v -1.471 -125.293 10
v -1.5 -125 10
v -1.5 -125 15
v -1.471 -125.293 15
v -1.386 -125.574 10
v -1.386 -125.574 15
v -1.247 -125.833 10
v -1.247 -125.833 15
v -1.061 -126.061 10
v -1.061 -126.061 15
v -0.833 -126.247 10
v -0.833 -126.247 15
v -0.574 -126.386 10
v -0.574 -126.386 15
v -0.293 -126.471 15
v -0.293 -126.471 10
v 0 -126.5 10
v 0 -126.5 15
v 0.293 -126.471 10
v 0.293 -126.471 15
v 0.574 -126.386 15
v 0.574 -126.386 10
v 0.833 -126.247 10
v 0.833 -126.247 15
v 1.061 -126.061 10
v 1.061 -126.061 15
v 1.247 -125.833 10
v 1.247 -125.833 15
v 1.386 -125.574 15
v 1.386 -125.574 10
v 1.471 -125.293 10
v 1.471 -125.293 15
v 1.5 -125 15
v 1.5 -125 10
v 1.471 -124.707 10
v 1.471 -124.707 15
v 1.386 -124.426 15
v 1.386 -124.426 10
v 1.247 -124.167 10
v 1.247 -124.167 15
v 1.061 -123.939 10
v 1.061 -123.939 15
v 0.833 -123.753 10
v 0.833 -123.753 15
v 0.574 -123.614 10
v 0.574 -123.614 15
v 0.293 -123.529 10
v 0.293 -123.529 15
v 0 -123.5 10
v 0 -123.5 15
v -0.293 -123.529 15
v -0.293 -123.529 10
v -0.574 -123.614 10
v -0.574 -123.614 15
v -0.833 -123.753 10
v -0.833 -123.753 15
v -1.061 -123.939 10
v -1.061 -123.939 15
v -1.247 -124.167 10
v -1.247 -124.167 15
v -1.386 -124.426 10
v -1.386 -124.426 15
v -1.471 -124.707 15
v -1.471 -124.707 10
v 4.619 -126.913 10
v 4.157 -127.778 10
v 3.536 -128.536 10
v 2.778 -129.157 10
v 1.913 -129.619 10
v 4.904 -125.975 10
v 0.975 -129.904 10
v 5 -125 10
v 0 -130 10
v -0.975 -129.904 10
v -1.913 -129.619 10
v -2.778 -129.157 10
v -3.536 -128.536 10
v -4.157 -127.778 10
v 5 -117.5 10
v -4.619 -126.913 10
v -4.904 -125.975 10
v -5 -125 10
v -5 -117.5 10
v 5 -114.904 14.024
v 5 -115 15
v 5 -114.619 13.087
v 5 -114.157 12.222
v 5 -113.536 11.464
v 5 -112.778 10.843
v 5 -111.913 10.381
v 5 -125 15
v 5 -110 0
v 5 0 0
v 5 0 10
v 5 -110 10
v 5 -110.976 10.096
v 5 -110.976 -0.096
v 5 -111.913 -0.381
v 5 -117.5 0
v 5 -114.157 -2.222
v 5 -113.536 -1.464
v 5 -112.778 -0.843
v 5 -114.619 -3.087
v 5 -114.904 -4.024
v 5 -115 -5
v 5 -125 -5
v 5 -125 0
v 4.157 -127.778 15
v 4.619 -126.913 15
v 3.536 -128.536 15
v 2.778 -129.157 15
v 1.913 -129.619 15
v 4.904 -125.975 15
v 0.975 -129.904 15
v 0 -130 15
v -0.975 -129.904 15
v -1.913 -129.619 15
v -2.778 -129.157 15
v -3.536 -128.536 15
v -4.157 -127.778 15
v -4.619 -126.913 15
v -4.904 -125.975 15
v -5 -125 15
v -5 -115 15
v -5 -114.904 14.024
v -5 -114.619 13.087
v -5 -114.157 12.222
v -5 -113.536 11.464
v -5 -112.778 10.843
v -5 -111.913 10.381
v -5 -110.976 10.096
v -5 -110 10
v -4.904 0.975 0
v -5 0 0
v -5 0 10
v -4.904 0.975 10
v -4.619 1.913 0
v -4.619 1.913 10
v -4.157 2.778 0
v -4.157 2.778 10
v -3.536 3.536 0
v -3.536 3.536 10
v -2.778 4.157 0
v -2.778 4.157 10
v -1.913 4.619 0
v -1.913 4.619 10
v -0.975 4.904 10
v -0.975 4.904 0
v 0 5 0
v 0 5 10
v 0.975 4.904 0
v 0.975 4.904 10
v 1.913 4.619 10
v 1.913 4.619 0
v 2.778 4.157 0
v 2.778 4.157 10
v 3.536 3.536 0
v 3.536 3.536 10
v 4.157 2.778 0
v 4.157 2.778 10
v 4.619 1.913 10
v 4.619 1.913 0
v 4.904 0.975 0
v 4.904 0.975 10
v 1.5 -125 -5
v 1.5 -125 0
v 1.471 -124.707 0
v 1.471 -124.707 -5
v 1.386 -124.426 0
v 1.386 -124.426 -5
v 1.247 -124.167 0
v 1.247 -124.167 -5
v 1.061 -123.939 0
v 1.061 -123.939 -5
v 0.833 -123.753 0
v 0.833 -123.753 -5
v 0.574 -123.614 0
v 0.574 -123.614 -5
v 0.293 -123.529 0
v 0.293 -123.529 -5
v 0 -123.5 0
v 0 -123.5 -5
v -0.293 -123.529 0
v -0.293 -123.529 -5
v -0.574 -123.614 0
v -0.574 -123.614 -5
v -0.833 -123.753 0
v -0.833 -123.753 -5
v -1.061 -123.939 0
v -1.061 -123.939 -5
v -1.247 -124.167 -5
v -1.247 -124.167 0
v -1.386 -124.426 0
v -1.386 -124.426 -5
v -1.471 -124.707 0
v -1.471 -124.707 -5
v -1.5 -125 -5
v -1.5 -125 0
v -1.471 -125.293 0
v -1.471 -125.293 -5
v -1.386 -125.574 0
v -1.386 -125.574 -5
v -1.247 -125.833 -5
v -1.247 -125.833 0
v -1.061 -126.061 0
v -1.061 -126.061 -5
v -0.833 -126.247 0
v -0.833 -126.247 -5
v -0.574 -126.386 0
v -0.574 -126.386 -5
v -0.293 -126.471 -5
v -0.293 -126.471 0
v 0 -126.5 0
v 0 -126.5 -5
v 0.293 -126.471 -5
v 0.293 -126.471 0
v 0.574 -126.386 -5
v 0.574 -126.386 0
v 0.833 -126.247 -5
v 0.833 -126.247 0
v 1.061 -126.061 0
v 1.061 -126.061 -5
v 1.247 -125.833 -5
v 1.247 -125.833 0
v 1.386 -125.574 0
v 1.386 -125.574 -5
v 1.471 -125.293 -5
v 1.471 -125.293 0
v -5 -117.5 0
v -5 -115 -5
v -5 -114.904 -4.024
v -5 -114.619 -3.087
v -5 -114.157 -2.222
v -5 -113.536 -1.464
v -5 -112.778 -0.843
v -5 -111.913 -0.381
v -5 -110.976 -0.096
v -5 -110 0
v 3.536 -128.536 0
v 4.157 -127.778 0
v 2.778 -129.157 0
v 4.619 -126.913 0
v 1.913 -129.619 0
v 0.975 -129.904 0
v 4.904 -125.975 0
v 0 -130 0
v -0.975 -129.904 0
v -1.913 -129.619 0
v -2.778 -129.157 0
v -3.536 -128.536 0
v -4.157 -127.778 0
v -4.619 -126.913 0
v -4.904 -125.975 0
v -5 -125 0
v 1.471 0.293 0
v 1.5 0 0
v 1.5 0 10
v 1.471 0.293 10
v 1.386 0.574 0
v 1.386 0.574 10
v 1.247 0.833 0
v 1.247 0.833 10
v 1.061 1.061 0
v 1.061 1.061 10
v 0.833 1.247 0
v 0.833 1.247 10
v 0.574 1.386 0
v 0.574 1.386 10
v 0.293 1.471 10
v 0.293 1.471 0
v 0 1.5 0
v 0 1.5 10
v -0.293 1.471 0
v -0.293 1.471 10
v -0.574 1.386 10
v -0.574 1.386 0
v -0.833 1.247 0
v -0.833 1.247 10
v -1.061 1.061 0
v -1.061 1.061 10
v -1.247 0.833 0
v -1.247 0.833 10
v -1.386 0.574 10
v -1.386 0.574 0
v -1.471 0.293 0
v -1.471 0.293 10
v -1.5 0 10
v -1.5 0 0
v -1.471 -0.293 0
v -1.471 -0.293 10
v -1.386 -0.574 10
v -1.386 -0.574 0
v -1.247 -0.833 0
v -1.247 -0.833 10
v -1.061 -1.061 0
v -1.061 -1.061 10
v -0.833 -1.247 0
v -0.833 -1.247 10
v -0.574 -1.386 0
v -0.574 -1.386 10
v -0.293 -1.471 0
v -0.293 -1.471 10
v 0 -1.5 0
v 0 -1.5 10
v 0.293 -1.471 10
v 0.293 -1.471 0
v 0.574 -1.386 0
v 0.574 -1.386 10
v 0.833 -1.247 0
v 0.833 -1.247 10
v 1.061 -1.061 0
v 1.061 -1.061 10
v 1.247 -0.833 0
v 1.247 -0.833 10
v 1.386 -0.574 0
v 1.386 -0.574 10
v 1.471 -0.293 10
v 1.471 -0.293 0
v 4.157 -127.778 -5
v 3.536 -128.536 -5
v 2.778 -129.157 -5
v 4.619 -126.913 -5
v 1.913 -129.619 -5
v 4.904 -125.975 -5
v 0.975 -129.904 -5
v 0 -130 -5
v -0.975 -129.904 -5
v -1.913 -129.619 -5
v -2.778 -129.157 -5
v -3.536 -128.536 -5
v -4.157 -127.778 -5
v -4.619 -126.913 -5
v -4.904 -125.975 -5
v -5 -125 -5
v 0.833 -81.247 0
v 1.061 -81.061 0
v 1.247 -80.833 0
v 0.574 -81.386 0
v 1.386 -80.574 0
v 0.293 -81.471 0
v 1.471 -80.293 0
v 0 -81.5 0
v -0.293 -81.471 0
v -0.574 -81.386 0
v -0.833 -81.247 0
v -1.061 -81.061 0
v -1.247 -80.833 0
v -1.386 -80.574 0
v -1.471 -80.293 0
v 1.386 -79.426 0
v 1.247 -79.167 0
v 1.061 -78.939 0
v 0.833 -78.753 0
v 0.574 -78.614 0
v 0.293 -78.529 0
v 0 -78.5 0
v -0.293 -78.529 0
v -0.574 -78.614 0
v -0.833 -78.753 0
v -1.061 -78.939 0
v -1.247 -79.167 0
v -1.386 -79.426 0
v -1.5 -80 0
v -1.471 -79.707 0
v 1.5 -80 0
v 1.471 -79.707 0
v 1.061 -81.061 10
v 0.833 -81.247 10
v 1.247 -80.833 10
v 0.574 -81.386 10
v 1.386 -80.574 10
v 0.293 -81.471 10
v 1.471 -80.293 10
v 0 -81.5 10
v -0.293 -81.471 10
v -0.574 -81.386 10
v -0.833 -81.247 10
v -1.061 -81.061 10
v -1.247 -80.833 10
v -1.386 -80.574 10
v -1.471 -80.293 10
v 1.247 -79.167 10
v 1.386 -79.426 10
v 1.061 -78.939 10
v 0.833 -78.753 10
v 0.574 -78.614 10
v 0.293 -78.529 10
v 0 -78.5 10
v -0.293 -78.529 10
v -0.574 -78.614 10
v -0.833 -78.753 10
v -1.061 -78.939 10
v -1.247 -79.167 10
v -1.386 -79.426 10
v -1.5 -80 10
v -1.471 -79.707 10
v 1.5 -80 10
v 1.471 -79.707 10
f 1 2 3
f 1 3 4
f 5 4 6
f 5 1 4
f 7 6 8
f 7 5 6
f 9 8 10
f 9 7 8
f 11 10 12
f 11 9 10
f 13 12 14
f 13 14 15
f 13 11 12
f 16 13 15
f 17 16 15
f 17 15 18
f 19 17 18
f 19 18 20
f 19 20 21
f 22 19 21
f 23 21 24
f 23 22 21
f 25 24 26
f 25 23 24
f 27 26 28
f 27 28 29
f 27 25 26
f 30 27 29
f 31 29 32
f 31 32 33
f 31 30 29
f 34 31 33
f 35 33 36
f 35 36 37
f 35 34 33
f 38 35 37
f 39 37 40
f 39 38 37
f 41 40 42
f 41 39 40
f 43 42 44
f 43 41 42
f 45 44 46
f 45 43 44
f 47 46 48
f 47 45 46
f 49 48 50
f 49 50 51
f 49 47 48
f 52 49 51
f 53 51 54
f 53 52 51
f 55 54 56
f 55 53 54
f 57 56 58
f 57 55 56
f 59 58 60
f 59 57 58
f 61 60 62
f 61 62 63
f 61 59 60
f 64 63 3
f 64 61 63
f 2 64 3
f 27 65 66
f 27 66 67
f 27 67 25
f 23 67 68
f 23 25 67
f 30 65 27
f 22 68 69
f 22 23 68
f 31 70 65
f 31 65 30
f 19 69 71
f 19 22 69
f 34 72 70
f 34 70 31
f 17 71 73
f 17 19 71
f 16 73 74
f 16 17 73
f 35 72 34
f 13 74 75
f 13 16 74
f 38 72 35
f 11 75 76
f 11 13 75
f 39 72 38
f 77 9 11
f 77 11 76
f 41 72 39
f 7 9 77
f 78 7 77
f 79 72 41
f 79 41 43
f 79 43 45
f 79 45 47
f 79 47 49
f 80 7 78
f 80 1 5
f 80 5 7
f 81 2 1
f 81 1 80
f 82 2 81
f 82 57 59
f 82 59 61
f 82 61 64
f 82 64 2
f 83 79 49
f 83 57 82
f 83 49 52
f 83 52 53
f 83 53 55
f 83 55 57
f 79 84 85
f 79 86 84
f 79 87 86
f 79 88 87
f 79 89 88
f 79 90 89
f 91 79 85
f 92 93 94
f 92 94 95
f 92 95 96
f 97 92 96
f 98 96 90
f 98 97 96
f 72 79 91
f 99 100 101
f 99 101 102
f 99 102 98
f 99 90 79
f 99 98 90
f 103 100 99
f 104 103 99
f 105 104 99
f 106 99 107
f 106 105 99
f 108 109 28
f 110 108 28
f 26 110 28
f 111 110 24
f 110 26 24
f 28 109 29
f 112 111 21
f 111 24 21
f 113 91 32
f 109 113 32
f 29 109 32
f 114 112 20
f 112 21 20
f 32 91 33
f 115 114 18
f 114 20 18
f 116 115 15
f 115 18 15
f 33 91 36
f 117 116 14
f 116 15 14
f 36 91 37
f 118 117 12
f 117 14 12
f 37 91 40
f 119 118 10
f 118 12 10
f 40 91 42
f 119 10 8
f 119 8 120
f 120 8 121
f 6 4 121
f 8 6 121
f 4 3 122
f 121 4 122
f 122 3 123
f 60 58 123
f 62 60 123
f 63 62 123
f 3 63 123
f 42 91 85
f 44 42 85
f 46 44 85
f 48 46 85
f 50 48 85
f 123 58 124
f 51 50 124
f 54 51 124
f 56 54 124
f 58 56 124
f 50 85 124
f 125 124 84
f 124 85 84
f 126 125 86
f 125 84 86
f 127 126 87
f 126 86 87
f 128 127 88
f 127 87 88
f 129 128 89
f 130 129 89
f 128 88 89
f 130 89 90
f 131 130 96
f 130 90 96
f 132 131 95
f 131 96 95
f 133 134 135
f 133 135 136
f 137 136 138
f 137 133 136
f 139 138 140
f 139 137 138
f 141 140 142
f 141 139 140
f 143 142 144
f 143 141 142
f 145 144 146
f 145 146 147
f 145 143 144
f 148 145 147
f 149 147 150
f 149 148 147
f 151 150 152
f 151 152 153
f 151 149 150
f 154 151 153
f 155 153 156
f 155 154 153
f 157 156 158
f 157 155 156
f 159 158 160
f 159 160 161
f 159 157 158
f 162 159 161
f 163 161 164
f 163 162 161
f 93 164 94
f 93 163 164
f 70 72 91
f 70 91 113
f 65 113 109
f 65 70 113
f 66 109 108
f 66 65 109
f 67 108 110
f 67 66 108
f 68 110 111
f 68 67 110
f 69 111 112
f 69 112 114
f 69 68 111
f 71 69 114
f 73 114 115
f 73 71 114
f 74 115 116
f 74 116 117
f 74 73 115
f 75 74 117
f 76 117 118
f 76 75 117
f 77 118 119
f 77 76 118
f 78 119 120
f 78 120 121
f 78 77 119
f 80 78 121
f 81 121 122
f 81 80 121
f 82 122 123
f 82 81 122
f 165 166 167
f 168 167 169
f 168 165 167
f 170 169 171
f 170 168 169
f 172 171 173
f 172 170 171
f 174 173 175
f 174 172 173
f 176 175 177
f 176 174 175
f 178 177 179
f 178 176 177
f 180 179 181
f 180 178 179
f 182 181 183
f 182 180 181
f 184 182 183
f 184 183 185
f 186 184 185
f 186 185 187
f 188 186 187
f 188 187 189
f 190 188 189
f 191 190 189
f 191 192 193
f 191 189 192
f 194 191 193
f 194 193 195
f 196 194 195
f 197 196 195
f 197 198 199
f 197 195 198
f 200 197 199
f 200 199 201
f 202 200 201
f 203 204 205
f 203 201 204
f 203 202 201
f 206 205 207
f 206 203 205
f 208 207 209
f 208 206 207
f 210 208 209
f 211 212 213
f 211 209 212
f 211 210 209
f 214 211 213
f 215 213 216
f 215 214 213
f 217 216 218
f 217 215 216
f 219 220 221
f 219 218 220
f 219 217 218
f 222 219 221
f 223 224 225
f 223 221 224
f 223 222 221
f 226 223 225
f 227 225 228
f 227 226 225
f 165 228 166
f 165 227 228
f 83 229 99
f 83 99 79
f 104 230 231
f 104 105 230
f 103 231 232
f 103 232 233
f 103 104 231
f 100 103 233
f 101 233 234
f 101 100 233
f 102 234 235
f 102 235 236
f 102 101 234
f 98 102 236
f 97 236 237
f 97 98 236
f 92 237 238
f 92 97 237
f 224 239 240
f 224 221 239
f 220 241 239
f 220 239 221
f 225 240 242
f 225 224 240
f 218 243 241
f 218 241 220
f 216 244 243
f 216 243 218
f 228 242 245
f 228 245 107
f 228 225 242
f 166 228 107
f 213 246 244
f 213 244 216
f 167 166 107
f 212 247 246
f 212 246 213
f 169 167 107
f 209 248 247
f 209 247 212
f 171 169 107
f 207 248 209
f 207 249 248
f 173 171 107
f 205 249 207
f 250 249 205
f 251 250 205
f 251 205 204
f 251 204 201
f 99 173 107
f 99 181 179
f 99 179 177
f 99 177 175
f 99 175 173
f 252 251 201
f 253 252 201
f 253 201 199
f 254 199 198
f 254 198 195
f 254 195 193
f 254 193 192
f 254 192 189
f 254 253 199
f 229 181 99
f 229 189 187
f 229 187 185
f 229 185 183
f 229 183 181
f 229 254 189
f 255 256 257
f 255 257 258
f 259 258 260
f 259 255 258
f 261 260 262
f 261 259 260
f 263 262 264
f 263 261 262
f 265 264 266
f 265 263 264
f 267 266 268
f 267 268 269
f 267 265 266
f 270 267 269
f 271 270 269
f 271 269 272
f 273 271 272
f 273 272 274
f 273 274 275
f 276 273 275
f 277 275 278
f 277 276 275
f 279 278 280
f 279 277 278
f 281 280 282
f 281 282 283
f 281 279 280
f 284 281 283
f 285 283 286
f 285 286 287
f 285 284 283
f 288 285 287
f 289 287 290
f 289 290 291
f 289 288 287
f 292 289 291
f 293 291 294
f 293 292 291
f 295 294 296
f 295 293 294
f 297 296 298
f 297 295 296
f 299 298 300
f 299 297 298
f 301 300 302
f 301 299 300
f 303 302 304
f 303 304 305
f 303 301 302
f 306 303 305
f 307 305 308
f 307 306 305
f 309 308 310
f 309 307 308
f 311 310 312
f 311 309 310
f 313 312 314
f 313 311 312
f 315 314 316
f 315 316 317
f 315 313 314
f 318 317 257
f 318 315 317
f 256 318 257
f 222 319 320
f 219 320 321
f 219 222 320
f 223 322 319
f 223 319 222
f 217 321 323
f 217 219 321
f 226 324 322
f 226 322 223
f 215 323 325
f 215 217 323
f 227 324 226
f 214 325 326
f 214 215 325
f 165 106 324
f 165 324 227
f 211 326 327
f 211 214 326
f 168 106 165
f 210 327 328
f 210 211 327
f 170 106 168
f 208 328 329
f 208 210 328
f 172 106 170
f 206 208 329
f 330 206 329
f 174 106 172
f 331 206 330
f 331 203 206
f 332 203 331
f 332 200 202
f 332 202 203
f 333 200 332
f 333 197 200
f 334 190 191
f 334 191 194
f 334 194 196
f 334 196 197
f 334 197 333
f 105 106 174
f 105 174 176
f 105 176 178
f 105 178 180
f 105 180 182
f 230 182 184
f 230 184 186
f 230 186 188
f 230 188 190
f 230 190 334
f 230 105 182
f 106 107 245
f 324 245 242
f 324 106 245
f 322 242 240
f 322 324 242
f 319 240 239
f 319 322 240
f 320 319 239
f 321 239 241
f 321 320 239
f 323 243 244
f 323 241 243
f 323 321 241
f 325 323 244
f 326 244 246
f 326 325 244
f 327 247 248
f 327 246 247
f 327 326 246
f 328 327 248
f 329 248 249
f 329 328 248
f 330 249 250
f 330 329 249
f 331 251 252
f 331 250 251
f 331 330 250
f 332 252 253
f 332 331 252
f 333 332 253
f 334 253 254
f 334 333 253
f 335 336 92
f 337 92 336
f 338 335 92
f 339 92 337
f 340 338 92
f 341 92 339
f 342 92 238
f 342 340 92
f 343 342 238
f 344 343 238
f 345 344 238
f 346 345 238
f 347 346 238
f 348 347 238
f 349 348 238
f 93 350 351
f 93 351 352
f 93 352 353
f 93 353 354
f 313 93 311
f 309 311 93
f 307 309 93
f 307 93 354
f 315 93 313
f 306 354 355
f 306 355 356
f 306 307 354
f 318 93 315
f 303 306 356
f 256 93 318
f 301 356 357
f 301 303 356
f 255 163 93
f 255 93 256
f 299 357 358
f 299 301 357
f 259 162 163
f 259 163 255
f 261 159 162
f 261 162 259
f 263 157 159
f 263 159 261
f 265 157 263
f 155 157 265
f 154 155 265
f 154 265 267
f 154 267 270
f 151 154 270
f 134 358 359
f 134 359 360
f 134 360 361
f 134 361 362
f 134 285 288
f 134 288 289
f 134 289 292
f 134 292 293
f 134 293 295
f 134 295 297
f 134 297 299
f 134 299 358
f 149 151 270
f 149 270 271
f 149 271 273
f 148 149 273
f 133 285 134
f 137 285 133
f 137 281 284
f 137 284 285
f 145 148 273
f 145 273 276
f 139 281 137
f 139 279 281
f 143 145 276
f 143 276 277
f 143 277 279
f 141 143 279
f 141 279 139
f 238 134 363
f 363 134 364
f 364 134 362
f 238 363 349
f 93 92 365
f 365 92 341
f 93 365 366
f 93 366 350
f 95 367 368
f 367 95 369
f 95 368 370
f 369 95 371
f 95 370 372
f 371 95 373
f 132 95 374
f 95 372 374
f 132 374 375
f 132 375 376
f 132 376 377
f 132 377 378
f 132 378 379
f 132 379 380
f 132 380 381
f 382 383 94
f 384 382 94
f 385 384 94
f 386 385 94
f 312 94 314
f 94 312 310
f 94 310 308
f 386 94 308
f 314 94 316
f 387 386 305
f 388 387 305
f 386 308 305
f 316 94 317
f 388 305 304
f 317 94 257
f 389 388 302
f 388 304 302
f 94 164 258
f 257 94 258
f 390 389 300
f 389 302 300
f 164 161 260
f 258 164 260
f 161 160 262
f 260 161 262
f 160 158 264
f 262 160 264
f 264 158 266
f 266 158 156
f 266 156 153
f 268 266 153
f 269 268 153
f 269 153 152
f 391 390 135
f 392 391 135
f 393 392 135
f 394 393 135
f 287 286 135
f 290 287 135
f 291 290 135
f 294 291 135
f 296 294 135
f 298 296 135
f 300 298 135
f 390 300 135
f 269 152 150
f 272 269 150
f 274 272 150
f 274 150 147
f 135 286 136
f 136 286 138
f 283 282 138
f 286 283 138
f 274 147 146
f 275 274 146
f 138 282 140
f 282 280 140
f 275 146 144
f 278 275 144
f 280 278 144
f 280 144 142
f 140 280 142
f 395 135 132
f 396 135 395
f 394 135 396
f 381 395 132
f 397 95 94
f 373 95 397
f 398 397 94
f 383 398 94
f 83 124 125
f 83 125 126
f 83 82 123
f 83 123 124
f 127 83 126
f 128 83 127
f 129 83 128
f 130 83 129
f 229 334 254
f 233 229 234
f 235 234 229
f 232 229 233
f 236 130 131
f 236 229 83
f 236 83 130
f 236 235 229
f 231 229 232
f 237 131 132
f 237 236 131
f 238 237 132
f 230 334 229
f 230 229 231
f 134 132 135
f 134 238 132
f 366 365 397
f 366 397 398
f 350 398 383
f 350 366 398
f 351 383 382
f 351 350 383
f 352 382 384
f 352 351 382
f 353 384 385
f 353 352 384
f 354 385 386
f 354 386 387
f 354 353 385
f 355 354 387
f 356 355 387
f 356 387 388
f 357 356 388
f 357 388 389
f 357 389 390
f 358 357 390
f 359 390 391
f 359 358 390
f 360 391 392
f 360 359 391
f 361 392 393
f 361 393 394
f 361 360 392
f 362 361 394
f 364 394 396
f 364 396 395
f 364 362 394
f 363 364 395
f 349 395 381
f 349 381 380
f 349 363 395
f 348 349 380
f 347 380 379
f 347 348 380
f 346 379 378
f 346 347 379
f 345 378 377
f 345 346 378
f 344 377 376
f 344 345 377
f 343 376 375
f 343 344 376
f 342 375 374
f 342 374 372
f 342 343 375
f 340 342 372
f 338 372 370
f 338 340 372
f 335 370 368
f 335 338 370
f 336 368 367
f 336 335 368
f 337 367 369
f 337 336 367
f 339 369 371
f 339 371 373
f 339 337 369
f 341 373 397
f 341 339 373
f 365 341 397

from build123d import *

# Parameters (mm, degrees)
CROQUIS1_R              = 1.5
SALIENTE_EXTRUIR1_DEPTH = 10
SALIENTE_EXTRUIR2_START = -5
CROQUIS3_R              = 1.5
SALIENTE_EXTRUIR2_DEPTH = 5
CROQUIS5_W              = 10
CROQUIS5_H              = 12.5
CORTAR_EXTRUIR1_DEPTH   = 16
CROQUIS2_R              = 1.5
SALIENTE_EXTRUIR3_DEPTH = 5
REDONDEO1_R             = 5


with BuildPart() as part:
    # Croquis1 → Saliente-Extruir1 (new body)
    with BuildSketch(Plane.XY):
        with BuildLine():
            Line((5, 0), (5, -125))
            ThreePointArc((5, -125), (0, -130), (-5, -125))
            Line((-5, -125), (-5, 0))
            ThreePointArc((-5, 0), (0, 5), (5, 0))
        make_face()
        Circle(CROQUIS1_R, mode=Mode.SUBTRACT)
        with Locations((0, -125)):
            Circle(CROQUIS1_R, mode=Mode.SUBTRACT)
        with Locations((0, -80)):
            Circle(CROQUIS1_R, mode=Mode.SUBTRACT)
    extrude(amount=SALIENTE_EXTRUIR1_DEPTH)

    # Croquis3 → Saliente-Extruir2 (add)
    with BuildSketch(Plane.XY.offset(SALIENTE_EXTRUIR2_START)):
        with BuildLine():
            Line((-5, -125), (-5, -115))
            Line((-5, -115), (5, -115))
            Line((5, -115), (5, -125))
            ThreePointArc((5, -125), (0, -130), (-5, -125))
        make_face()
        with Locations((0, -125)):
            Circle(CROQUIS3_R, mode=Mode.SUBTRACT)
    extrude(amount=SALIENTE_EXTRUIR2_DEPTH)

    # Croquis5 → Cortar-Extruir1 (cut)
    with BuildSketch(Plane.ZY.offset(5)):
        with Locations((5, -123.75)):
            Rectangle(CROQUIS5_W, CROQUIS5_H)
    extrude(amount=-CORTAR_EXTRUIR1_DEPTH, mode=Mode.SUBTRACT)

    # Croquis2 → Saliente-Extruir3 (add)
    with BuildSketch(Plane.XY.offset(10)):
        with BuildLine():
            Line((-5, -125), (-5, -115))
            Line((-5, -115), (5, -115))
            Line((5, -115), (5, -125))
            ThreePointArc((5, -125), (0, -130), (-5, -125))
        make_face()
        with Locations(Location((0, -125, 0), (0, 0, 180))):
            Circle(CROQUIS2_R, mode=Mode.SUBTRACT)
    extrude(amount=SALIENTE_EXTRUIR3_DEPTH)

    # Redondeo1
    redondeo1_edges = [part.edges().sort_by_distance(p)[0] for p in [
        (0, -115, 10),
        (0, -115, 0),
    ]]
    fillet(redondeo1_edges, radius=REDONDEO1_R - 0.0001)  # a hair under: the kernel refuses the full size


solid = part.part
